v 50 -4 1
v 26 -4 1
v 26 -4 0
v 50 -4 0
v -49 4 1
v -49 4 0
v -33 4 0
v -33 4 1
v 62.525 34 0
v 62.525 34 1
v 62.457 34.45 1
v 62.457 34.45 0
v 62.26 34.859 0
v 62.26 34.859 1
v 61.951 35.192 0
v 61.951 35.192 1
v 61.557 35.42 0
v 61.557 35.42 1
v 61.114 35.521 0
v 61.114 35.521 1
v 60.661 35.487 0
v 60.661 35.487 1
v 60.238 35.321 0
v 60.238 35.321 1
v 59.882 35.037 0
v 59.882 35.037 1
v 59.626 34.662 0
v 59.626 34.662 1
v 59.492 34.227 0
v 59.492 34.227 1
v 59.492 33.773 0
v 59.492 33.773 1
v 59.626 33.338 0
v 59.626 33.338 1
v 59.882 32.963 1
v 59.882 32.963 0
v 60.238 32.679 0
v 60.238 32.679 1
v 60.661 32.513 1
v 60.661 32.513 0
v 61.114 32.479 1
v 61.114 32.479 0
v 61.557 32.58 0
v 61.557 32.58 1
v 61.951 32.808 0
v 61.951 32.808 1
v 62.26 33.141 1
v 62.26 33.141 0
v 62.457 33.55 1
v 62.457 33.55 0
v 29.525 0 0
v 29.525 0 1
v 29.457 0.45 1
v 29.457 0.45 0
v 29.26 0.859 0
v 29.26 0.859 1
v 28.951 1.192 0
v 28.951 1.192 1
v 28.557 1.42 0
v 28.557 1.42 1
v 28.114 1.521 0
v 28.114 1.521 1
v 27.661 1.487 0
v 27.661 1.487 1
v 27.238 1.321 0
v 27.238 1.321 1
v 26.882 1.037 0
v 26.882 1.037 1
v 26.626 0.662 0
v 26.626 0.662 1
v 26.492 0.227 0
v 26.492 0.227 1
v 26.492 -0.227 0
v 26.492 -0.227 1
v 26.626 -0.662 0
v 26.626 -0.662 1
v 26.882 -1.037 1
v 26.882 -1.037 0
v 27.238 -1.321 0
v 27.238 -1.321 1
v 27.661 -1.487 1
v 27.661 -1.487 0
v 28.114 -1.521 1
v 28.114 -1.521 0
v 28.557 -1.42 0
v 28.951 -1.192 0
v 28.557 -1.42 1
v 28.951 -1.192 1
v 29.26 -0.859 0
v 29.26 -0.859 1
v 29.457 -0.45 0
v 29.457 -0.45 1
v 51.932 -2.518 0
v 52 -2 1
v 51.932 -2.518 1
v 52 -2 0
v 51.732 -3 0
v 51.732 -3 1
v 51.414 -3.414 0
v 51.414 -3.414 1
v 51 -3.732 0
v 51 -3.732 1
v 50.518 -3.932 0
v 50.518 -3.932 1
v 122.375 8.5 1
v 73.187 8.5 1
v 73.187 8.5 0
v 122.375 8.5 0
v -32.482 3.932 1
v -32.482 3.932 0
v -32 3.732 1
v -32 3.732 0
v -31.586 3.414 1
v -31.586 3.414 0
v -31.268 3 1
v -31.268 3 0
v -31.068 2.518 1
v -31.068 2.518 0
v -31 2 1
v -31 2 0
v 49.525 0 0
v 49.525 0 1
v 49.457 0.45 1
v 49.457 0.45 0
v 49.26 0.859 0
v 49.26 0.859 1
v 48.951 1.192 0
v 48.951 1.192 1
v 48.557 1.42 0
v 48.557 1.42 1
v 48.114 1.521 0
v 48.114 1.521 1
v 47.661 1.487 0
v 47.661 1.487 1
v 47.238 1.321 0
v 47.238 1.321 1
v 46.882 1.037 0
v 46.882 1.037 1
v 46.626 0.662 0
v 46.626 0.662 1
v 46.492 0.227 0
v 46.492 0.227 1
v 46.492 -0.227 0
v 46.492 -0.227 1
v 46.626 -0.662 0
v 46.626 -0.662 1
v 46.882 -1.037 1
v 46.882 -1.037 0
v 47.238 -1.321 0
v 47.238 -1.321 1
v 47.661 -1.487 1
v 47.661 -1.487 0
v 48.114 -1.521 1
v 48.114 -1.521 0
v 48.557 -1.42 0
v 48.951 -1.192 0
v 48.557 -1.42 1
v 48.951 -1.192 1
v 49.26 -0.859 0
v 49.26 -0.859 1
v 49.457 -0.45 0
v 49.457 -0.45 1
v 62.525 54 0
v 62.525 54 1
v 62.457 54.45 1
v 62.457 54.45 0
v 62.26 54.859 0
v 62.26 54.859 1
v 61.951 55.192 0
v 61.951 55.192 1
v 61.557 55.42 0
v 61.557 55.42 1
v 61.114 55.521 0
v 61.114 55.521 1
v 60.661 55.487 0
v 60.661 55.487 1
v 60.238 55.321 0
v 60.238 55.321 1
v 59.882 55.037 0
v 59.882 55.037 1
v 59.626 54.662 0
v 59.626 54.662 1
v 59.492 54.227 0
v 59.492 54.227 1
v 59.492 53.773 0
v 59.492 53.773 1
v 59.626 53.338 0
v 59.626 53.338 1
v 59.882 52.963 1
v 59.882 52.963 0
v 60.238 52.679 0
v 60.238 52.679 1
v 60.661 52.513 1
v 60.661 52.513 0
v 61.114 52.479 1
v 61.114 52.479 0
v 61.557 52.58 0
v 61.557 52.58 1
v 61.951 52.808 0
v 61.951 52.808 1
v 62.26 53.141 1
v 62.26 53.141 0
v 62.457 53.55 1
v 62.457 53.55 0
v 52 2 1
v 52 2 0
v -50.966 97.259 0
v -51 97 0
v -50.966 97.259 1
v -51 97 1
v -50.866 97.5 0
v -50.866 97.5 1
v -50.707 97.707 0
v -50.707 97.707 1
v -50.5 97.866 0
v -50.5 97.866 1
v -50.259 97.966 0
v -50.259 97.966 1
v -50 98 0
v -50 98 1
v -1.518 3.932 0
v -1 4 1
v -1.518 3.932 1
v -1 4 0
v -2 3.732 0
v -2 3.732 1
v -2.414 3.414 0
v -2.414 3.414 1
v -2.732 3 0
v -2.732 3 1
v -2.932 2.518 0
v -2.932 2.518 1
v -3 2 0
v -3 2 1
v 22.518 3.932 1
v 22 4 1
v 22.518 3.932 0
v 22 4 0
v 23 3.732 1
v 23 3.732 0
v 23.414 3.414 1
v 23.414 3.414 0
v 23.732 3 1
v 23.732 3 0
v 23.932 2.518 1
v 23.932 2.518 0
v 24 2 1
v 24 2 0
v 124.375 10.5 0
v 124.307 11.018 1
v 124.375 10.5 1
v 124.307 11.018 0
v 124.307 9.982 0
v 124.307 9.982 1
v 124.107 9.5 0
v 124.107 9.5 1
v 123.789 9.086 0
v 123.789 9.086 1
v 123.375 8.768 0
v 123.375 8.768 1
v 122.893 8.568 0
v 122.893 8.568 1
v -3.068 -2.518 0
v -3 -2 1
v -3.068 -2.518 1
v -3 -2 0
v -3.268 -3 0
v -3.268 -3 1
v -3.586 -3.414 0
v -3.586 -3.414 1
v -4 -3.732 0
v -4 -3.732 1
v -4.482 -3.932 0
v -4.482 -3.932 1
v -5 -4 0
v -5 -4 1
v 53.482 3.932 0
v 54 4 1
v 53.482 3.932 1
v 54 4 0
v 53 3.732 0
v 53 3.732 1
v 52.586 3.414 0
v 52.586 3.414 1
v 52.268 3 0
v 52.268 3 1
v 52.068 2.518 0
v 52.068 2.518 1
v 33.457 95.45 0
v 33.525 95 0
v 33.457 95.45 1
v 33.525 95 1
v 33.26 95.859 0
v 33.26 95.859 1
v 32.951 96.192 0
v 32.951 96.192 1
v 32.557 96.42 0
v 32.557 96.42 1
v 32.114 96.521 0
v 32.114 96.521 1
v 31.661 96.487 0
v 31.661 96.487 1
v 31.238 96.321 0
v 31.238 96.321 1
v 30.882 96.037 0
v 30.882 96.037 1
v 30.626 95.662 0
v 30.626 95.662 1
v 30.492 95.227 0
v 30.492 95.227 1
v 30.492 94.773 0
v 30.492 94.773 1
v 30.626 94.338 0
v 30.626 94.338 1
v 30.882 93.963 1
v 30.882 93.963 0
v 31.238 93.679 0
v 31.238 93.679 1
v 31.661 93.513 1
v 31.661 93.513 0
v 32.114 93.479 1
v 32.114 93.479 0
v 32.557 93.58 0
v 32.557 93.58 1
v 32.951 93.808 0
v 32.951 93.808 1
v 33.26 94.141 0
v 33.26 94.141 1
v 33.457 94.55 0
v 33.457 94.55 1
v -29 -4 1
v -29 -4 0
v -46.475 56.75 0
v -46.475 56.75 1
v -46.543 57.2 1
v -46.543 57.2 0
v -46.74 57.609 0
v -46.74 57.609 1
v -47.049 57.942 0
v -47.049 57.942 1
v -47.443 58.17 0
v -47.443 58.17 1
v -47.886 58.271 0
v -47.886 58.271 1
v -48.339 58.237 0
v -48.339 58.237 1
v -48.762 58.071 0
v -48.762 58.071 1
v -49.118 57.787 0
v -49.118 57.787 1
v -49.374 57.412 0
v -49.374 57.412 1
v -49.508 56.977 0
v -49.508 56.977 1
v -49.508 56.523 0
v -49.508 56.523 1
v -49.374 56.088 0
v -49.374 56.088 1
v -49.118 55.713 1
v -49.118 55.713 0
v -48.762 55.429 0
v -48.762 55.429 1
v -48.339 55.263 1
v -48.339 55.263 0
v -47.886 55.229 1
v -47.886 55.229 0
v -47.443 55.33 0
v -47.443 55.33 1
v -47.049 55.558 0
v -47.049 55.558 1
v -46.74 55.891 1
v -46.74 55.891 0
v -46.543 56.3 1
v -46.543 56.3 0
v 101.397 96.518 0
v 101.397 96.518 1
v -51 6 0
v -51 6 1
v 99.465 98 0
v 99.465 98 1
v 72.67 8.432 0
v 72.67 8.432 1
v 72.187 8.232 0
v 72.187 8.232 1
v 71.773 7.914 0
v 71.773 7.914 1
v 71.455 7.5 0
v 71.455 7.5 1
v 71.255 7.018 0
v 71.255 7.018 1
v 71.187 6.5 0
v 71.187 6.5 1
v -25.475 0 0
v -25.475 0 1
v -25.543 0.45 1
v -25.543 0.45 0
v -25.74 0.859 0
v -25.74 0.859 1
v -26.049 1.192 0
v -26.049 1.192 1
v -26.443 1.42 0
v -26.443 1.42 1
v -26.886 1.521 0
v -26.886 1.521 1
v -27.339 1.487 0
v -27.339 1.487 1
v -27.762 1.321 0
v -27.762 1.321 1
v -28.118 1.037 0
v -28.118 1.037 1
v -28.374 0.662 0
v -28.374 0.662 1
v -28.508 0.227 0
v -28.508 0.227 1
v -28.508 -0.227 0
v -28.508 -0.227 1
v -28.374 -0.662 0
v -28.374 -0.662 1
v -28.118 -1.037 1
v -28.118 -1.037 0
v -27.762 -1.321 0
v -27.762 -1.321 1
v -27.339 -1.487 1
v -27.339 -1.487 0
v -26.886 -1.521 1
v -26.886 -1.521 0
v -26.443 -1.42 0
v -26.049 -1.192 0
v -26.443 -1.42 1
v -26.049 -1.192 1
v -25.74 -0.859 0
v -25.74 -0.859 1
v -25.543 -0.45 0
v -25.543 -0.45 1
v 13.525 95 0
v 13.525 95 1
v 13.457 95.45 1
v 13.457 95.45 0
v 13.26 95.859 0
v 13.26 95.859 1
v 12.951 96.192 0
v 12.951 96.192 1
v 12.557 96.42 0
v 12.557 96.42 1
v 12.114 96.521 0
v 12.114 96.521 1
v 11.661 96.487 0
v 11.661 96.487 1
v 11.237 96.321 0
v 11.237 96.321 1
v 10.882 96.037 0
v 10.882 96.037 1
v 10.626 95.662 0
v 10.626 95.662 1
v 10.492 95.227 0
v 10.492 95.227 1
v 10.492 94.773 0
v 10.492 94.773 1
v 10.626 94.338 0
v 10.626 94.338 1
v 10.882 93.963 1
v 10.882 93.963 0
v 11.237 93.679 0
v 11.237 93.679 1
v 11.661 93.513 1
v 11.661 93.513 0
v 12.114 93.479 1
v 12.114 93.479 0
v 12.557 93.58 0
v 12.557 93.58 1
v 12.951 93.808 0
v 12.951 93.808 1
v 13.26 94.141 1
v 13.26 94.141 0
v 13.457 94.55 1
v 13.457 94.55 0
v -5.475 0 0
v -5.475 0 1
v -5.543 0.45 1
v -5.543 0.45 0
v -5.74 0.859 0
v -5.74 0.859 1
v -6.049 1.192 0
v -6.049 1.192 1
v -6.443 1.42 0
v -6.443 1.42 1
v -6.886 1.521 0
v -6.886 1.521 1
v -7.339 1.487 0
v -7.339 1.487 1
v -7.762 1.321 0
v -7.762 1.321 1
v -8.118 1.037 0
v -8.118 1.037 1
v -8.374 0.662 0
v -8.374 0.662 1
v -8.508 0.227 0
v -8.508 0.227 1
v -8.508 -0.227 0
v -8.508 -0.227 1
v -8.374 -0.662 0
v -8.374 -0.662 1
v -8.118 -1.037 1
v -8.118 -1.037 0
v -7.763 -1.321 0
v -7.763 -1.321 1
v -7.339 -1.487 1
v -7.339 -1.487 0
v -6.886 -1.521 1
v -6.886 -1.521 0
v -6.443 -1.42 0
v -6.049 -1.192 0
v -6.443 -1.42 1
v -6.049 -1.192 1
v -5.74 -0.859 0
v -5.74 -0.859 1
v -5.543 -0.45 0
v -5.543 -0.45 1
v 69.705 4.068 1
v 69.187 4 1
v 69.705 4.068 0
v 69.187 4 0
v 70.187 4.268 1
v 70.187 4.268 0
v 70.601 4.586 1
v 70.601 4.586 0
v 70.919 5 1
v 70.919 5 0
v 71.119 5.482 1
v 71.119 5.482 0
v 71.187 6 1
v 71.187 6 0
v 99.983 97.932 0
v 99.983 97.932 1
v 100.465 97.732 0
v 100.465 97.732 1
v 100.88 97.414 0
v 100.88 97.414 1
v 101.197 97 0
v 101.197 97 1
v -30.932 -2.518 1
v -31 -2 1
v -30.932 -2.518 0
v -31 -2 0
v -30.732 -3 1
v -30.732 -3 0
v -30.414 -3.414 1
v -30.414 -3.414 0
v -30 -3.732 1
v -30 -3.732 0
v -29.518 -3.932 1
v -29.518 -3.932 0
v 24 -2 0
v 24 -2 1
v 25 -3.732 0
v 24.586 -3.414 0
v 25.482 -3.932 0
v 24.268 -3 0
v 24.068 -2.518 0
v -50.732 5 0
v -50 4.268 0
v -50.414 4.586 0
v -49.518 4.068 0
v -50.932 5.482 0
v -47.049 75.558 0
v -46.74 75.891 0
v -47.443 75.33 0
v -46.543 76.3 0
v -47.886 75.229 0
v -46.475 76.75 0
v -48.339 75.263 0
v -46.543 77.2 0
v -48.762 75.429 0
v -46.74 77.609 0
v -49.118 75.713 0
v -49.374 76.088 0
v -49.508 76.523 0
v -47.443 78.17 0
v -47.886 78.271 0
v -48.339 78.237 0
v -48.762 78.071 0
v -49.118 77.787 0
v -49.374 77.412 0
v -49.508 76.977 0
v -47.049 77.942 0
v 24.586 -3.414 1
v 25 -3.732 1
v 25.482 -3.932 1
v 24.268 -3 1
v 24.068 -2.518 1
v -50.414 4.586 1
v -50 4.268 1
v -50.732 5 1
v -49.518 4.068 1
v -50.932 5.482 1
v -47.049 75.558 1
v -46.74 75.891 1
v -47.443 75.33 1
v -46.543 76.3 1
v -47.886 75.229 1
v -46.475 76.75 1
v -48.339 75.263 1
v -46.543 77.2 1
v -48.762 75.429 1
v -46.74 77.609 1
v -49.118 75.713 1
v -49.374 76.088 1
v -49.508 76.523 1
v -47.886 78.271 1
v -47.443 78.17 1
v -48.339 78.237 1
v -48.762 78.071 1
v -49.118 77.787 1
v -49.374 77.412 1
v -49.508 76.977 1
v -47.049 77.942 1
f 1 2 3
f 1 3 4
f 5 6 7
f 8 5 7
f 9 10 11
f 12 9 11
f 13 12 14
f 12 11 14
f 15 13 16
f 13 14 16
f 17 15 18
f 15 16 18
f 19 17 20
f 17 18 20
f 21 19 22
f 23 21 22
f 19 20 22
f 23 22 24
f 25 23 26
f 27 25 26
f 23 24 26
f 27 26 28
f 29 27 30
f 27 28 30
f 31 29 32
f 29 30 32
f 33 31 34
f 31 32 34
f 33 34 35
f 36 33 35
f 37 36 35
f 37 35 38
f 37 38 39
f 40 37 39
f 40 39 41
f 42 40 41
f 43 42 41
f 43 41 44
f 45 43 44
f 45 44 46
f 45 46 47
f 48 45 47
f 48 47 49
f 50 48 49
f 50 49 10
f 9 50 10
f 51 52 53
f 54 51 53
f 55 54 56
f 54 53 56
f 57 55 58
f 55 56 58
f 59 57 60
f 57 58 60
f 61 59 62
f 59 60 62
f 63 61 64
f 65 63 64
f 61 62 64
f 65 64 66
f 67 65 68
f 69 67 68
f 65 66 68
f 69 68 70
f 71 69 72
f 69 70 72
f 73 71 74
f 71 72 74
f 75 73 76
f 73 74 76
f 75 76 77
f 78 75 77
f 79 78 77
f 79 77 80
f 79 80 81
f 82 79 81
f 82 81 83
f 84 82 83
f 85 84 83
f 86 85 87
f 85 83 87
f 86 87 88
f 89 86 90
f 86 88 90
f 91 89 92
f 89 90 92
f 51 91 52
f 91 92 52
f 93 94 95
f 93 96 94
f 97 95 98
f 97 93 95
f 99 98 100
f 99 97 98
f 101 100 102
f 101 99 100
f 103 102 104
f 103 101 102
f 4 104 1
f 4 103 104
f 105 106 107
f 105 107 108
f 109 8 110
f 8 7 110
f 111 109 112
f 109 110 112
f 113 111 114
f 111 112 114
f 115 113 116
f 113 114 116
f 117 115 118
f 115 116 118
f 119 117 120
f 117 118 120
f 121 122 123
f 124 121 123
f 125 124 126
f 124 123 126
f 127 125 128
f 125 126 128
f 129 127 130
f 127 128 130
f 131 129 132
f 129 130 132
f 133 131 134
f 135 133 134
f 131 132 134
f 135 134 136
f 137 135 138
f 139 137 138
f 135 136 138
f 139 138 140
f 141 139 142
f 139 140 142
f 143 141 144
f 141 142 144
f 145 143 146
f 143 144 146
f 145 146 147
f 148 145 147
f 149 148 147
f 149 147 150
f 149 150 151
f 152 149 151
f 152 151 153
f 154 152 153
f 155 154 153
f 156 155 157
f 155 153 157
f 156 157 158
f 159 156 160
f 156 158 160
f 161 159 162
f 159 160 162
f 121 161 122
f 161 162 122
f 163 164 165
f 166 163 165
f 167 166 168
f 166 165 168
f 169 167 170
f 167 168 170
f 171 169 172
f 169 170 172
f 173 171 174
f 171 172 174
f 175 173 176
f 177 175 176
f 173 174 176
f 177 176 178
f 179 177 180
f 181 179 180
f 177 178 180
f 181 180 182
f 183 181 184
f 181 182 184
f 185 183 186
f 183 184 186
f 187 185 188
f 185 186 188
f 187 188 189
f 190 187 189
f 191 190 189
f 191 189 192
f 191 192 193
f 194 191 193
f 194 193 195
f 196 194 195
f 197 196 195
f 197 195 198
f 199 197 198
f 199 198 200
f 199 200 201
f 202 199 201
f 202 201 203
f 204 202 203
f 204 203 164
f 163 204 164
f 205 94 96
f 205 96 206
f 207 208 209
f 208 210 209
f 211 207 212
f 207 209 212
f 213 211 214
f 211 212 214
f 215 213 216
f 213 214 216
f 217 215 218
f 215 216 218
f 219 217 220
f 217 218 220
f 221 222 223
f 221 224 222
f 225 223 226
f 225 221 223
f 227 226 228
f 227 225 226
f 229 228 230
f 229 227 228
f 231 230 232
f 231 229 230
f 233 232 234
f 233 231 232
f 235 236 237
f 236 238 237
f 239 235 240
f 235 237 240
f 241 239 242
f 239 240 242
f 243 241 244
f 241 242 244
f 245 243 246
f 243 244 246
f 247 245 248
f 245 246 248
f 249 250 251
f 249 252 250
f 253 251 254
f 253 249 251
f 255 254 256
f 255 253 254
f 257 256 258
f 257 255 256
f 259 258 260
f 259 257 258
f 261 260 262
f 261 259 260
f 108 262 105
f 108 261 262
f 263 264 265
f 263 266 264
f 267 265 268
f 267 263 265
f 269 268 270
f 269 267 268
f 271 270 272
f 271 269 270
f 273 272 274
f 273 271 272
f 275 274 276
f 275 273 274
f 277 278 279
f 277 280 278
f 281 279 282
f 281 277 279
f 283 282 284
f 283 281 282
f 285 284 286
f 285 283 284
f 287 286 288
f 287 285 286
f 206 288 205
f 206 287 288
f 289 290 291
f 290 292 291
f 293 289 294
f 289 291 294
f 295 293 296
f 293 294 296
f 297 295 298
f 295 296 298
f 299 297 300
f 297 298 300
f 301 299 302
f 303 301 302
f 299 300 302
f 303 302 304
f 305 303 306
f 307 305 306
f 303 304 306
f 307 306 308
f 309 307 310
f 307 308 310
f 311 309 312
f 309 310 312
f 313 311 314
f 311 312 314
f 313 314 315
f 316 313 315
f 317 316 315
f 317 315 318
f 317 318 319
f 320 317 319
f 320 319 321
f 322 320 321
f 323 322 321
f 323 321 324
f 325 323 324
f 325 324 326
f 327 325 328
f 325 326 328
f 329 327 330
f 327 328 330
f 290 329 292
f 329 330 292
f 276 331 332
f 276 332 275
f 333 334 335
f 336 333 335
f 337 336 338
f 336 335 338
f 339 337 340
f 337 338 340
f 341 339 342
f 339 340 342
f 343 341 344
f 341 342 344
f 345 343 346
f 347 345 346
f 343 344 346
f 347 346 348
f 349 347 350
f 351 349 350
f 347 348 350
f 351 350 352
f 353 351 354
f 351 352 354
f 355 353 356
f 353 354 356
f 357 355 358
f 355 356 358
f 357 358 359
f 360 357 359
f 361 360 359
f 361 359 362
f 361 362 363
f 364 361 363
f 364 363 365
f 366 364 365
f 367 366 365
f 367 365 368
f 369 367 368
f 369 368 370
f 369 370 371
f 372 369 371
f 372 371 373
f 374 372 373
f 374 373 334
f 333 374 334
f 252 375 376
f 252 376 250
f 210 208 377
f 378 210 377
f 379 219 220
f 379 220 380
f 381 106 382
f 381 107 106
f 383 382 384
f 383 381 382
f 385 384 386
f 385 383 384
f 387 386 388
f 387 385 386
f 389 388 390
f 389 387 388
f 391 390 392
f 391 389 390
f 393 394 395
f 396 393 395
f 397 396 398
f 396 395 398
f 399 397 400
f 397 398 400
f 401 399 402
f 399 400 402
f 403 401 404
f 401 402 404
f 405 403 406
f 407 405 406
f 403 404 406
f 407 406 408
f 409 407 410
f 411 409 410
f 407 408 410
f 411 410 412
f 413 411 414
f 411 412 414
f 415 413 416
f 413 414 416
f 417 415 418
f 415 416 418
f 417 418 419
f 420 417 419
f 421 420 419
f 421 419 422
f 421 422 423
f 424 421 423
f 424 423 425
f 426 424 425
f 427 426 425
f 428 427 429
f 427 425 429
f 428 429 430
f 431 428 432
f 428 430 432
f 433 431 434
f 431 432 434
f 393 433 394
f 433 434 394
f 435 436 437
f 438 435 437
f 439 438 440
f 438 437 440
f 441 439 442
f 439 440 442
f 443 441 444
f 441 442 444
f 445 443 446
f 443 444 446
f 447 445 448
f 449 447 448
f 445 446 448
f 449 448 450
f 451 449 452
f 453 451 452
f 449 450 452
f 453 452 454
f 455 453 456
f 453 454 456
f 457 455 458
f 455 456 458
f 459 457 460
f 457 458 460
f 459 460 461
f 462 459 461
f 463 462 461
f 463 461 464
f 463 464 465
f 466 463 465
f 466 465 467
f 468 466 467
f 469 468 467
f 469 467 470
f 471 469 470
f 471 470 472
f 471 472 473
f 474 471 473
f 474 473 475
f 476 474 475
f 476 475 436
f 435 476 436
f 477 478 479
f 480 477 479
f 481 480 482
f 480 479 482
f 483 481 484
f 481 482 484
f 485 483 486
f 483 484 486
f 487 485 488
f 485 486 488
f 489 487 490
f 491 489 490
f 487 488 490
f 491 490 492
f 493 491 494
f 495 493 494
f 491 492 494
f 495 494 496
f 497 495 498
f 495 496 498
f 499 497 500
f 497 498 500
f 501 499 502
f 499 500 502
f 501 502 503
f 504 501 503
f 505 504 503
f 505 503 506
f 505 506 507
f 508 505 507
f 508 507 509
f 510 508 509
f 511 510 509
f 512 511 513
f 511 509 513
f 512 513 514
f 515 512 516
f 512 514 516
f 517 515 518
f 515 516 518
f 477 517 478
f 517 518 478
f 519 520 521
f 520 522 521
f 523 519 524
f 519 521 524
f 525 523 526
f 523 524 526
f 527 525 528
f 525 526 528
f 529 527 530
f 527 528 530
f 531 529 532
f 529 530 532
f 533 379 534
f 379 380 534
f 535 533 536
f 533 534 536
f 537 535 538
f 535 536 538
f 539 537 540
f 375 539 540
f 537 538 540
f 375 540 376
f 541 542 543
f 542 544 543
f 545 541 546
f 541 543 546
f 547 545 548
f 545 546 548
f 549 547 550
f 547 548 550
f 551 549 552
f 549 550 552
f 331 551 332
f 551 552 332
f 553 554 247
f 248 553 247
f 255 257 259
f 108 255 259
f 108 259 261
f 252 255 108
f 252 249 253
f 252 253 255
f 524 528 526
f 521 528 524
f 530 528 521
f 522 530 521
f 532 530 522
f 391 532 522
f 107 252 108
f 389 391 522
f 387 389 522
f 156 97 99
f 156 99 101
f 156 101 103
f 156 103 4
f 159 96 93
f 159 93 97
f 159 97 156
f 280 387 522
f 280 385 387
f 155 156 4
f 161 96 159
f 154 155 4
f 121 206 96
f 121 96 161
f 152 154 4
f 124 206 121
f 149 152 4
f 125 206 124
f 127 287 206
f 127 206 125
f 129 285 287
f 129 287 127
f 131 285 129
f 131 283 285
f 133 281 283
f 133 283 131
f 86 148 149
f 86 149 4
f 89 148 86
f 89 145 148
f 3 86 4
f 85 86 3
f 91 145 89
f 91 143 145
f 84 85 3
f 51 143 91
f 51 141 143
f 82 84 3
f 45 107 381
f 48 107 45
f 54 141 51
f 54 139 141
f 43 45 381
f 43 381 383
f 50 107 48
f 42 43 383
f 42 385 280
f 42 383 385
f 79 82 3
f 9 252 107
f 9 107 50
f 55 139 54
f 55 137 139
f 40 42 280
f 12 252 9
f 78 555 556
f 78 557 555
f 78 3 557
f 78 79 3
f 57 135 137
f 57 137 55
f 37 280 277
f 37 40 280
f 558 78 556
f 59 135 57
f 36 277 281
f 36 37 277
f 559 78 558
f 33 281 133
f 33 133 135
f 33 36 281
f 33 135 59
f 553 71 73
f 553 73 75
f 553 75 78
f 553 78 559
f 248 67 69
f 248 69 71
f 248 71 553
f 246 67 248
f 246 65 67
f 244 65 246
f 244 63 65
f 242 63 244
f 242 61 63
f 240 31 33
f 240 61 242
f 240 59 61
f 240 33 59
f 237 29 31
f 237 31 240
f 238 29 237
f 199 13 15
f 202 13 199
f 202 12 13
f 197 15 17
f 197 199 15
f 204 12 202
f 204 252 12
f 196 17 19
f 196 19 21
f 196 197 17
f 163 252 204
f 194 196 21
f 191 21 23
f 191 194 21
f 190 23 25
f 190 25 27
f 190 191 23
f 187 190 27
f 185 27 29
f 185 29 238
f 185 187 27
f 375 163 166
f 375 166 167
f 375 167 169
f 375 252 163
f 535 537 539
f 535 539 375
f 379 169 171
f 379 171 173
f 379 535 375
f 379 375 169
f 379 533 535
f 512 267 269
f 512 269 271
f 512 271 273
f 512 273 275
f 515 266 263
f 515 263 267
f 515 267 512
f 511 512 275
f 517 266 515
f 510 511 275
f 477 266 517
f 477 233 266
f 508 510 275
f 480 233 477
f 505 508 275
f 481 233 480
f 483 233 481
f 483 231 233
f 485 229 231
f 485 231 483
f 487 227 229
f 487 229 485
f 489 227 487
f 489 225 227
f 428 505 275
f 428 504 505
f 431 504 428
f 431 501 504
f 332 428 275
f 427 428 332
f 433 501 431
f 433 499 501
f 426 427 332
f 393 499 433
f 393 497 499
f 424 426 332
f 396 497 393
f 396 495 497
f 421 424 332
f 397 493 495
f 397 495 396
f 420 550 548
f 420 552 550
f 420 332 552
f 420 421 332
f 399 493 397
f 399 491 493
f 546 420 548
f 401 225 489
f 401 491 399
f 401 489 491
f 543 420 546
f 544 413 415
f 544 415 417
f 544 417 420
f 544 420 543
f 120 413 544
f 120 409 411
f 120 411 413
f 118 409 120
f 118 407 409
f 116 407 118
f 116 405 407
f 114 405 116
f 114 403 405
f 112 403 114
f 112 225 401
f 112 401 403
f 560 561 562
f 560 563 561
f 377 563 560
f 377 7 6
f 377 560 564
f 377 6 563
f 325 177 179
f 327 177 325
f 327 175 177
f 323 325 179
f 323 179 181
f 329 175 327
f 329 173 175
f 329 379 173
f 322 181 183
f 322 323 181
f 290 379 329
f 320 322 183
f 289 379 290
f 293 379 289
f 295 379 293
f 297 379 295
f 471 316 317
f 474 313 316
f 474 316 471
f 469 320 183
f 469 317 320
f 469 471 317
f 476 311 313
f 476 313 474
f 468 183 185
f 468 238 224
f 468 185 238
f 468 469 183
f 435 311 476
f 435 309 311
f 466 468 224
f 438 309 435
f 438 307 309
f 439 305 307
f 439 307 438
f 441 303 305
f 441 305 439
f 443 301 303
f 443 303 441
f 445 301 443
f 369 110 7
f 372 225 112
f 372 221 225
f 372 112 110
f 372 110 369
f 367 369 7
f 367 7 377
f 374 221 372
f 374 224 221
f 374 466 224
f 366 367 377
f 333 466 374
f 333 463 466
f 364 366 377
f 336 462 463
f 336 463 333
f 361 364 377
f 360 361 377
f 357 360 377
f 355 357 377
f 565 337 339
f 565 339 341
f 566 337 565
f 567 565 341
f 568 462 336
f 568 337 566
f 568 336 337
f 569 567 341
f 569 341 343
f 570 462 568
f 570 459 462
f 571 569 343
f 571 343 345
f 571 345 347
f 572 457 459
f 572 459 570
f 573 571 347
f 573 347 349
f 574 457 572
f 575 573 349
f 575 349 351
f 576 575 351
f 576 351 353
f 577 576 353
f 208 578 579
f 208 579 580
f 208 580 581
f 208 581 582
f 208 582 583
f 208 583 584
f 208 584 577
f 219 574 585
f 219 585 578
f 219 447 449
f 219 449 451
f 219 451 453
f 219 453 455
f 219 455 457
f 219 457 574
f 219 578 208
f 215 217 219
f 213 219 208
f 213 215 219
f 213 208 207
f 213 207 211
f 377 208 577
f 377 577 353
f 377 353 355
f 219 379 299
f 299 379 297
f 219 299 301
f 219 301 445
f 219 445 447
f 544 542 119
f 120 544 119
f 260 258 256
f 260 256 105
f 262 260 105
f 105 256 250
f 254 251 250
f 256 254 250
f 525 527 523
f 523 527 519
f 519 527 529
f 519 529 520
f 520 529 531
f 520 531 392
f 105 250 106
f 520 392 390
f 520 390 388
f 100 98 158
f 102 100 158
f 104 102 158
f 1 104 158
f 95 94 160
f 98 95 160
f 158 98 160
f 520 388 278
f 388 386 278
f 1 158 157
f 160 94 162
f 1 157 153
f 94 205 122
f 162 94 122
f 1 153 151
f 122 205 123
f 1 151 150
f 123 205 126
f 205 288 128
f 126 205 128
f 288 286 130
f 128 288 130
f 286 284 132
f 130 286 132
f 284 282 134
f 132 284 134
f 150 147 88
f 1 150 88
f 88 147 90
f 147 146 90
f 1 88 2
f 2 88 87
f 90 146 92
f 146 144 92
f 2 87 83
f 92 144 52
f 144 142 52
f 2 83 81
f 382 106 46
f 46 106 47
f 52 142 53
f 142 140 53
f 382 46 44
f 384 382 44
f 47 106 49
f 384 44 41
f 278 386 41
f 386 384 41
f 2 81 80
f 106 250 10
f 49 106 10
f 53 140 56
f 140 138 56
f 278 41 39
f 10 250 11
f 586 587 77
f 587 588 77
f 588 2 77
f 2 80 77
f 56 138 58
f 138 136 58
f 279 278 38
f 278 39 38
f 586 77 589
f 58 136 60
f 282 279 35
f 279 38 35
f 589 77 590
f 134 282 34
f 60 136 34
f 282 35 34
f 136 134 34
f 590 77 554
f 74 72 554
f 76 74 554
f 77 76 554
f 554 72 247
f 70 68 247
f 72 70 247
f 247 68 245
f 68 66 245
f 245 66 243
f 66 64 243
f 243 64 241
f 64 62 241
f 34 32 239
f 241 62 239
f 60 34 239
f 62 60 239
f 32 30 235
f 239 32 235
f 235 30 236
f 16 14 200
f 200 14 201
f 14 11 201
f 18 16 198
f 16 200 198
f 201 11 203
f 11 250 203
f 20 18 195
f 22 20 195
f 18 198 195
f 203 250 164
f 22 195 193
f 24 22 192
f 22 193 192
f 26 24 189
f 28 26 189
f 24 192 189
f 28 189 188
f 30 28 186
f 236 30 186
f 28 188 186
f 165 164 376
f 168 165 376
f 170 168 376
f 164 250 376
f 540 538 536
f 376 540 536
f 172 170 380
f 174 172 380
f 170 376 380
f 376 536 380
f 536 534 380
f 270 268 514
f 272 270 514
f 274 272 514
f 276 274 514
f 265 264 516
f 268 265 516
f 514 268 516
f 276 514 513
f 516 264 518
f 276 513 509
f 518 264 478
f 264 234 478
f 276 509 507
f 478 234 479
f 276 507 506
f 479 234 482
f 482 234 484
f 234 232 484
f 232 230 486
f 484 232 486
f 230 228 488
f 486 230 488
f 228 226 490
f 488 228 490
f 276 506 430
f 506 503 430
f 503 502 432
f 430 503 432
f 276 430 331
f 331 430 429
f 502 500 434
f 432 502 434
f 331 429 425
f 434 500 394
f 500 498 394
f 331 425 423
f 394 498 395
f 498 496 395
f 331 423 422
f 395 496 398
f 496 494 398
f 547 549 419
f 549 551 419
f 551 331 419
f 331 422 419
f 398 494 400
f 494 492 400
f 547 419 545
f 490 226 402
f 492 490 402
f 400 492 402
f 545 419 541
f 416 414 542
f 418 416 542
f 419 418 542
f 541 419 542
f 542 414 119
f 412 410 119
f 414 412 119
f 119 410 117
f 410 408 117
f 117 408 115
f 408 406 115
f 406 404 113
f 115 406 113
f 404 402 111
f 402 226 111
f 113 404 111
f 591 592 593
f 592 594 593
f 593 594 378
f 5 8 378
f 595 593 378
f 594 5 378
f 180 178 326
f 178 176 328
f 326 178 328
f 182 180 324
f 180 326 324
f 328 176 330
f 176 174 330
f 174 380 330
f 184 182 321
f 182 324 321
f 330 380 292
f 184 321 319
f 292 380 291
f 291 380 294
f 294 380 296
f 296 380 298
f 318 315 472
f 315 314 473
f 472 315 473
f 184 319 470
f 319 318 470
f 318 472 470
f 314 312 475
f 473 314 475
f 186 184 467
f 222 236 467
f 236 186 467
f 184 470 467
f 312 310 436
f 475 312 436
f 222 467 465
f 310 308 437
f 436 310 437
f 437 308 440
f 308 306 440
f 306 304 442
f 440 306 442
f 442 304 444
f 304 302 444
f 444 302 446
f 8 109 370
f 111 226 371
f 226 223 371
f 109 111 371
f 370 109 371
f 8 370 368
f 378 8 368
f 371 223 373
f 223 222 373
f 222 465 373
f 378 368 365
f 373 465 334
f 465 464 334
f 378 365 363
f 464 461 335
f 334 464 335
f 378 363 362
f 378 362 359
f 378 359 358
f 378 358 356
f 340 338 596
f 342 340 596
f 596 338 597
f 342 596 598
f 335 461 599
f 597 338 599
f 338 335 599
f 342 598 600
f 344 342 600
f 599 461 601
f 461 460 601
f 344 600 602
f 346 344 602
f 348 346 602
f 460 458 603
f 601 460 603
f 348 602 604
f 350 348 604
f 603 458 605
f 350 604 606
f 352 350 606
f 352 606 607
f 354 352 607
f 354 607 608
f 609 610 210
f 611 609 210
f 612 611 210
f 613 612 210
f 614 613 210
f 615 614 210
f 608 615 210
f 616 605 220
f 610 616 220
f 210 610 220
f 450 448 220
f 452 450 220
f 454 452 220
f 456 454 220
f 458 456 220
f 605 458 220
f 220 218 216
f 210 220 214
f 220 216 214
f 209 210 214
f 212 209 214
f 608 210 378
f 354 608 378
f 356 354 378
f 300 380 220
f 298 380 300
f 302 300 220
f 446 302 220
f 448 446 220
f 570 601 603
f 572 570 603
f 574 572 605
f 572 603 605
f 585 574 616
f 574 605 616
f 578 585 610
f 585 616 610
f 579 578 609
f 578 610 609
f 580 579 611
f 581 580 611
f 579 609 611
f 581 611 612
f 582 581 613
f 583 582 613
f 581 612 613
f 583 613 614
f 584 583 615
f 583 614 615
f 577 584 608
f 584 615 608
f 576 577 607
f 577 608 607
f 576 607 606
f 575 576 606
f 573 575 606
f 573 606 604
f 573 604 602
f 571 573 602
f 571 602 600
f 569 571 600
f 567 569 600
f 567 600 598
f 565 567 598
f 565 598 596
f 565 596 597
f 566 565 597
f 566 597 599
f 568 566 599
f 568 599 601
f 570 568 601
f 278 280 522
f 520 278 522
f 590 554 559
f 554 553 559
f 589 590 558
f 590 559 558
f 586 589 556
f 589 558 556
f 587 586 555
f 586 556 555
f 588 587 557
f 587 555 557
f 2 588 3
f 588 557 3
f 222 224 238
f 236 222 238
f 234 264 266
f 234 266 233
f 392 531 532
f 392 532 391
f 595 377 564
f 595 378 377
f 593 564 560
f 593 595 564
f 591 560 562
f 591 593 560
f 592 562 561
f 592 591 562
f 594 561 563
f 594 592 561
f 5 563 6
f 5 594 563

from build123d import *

# Parameters (mm, degrees)
SKETCH_1_W          = 28
SKETCH_1_H          = 8
SKETCH_1_R          = 1.525
EXTRUDE_1_DEPTH     = 1
FILLET_1_R          = 2
SKETCH_3_R          = 1.525
CUT_EXTRUDE_1_DEPTH = 10
CUT_EXTRUDE_2_DEPTH = 10
SKETCH_5_R          = 1.525
CUT_EXTRUDE_3_DEPTH = 10
FILLET_3_R          = 2
SKETCH_8_R          = 1.525
CUT_EXTRUDE_5_DEPTH = 5
SKETCH_9_W          = 29
SKETCH_9_H          = 22
CUT_EXTRUDE_6_DEPTH = 11
FILLET_4_R          = 1
EXTRUDE_2_DEPTH     = 1
SKETCH_12_W         = 55
SKETCH_12_H         = 4.5
CUT_EXTRUDE_7_DEPTH = 10
FILLET_5_R          = 2
SKETCH_13_W         = 32
SKETCH_13_H         = 8
CUT_EXTRUDE_8_DEPTH = 10
SKETCH_14_W         = 28
SKETCH_14_H         = 8
SKETCH_14_R         = 1.525
EXTRUDE_3_DEPTH     = 1
FILLET_6_R          = 2


with BuildPart() as part:
    # 草图1 → 凸台-拉伸1 (new body)
    with BuildSketch(Plane.XY):
        Polygon((-4, 4), (24, 4), (67, 4), (67, 120), (-51, 120), (-51, 4), align=None)
        with Locations((10, 0)):
            Rectangle(SKETCH_1_W, SKETCH_1_H)
        with Locations((20, 0)):
            Circle(SKETCH_1_R, mode=Mode.SUBTRACT)
        Circle(SKETCH_1_R, mode=Mode.SUBTRACT)
    extrude(amount=EXTRUDE_1_DEPTH)

    # 圆角1
    fillet_1_edges = [part.edges().sort_by_distance(p)[0] for p in [
        (67, 4, 0.5),
        (24, 4, 0.5),
        (24, -4, 0.5),
        (-4, -4, 0.5),
        (-4, 4, 0.5),
        (-51, 4, 0.5),
        (-51, 120, 0.5),
        (67, 120, 0.5),
    ]]
    fillet(fillet_1_edges, radius=FILLET_1_R)

    # 草图3 → 切除-拉伸1 (cut)
    with BuildSketch(Plane.XY.offset(1)):
        with Locations((-48, 76.75)):
            Circle(SKETCH_3_R)
        with Locations((-48, 56.75)):
            Circle(SKETCH_3_R)
    extrude(amount=-CUT_EXTRUDE_1_DEPTH, mode=Mode.SUBTRACT)

    # 草图4 → 切除-拉伸2 (cut)
    with BuildSketch(Plane.XY.offset(1)):
        with BuildLine():
            Line((65, 120), (-24, 120))
            Line((-24, 120), (-24, 98))
            Line((-24, 98), (67, 98))
            Line((67, 98), (67, 118))
            ThreePointArc((67, 118), (66.414213562, 119.414213562), (65, 120))
        make_face()
    extrude(amount=-CUT_EXTRUDE_2_DEPTH, mode=Mode.SUBTRACT)

    # 草图5 → 切除-拉伸3 (cut)
    with BuildSketch(Plane.XY.offset(1)):
        with Locations((61, 34)):
            Circle(SKETCH_5_R)
        with Locations((61, 54)):
            Circle(SKETCH_5_R)
    extrude(amount=-CUT_EXTRUDE_3_DEPTH, mode=Mode.SUBTRACT)

    # 圆角3
    fillet_3_edges = [part.edges().sort_by_distance(p)[0] for p in [
        (-24, 98, 0.5),
        (67, 98, 0.5),
        (-24, 120, 0.5),
    ]]
    fillet(fillet_3_edges, radius=FILLET_3_R)

    # 草图8 → 切除-拉伸5 (cut, symmetric)
    with BuildSketch(Plane.XY.offset(1)):
        with Locations((12, 95)):
            Circle(SKETCH_8_R)
        with Locations((32, 95)):
            Circle(SKETCH_8_R)
    extrude(amount=CUT_EXTRUDE_5_DEPTH, both=True, mode=Mode.SUBTRACT)

    # 草图9 → 切除-拉伸6 (cut, symmetric)
    with BuildSketch(Plane.XY.offset(1)):
        with Locations((-36.5, 109)):
            Rectangle(SKETCH_9_W, SKETCH_9_H)
    extrude(amount=CUT_EXTRUDE_6_DEPTH, both=True, mode=Mode.SUBTRACT)

    # 圆角4
    fillet_4_edges = [part.edges().sort_by_distance(p)[0] for p in [
        (-51, 98, 0.5),
    ]]
    fillet(fillet_4_edges, radius=FILLET_4_R)

    # 草图11 → 凸台-拉伸2 (add)
    with BuildSketch(Plane(origin=(0, 0, 0), x_dir=(-1, 0, 0), z_dir=(0, 0, -1))):
        with BuildLine():
            ThreePointArc((-67, 96), (-66.414213562, 97.414213562), (-65, 98))
            Line((-65, 98), (-101, 98))
            Line((-101, 98), (-126.187224089, 4))
            Line((-126.187224089, 4), (-65, 4))
            ThreePointArc((-65, 4), (-66.414213562, 4.585786438), (-67, 6))
            Line((-67, 6), (-67, 96))
        make_face()
    extrude(amount=-EXTRUDE_2_DEPTH)

    # 草图12 → 切除-拉伸7 (cut)
    with BuildSketch(Plane.XY.offset(1)):
        with Locations((98.687224089, 6.25)):
            Rectangle(SKETCH_12_W, SKETCH_12_H)
    extrude(amount=-CUT_EXTRUDE_7_DEPTH, mode=Mode.SUBTRACT)

    # 圆角5
    fillet_5_edges = [part.edges().sort_by_distance(p)[0] for p in [
        (101, 98, 0.5),
        (124.981452723, 8.5, 0.5),
        (71.187224089, 4, 0.5),
        (71.187224089, 8.5, 0.5),
    ]]
    fillet(fillet_5_edges, radius=FILLET_5_R)

    # 草图13 → 切除-拉伸8 (cut)
    with BuildSketch(Plane.XY.offset(1)):
        with Locations((10, 0)):
            Rectangle(SKETCH_13_W, SKETCH_13_H)
    extrude(amount=-CUT_EXTRUDE_8_DEPTH, mode=Mode.SUBTRACT)

    # 草图14 → 凸台-拉伸3 (add)
    with BuildSketch(Plane.XY.offset(1)):
        with Locations((-17, 0)):
            Rectangle(SKETCH_14_W, SKETCH_14_H)
        with Locations((-27, 0)):
            Circle(SKETCH_14_R, mode=Mode.SUBTRACT)
        with Locations((-7, 0)):
            Circle(SKETCH_14_R, mode=Mode.SUBTRACT)
        with Locations((38, 0)):
            Rectangle(SKETCH_14_W, SKETCH_14_H)
        with Locations((28, 0)):
            Circle(SKETCH_14_R, mode=Mode.SUBTRACT)
        with Locations((48, 0)):
            Circle(SKETCH_14_R, mode=Mode.SUBTRACT)
    extrude(amount=-EXTRUDE_3_DEPTH)

    # 圆角6
    fillet_6_edges = [part.edges().sort_by_distance(p)[0] for p in [
        (52, -4, 0.5),
        (52, 4, 0.5),
        (24, 4, 0.5),
        (24, -4, 0.5),
        (-3, -4, 0.5),
        (-3, 4, 0.5),
        (-31, 4, 0.5),
        (-31, -4, 0.5),
    ]]
    fillet(fillet_6_edges, radius=FILLET_6_R)


solid = part.part
